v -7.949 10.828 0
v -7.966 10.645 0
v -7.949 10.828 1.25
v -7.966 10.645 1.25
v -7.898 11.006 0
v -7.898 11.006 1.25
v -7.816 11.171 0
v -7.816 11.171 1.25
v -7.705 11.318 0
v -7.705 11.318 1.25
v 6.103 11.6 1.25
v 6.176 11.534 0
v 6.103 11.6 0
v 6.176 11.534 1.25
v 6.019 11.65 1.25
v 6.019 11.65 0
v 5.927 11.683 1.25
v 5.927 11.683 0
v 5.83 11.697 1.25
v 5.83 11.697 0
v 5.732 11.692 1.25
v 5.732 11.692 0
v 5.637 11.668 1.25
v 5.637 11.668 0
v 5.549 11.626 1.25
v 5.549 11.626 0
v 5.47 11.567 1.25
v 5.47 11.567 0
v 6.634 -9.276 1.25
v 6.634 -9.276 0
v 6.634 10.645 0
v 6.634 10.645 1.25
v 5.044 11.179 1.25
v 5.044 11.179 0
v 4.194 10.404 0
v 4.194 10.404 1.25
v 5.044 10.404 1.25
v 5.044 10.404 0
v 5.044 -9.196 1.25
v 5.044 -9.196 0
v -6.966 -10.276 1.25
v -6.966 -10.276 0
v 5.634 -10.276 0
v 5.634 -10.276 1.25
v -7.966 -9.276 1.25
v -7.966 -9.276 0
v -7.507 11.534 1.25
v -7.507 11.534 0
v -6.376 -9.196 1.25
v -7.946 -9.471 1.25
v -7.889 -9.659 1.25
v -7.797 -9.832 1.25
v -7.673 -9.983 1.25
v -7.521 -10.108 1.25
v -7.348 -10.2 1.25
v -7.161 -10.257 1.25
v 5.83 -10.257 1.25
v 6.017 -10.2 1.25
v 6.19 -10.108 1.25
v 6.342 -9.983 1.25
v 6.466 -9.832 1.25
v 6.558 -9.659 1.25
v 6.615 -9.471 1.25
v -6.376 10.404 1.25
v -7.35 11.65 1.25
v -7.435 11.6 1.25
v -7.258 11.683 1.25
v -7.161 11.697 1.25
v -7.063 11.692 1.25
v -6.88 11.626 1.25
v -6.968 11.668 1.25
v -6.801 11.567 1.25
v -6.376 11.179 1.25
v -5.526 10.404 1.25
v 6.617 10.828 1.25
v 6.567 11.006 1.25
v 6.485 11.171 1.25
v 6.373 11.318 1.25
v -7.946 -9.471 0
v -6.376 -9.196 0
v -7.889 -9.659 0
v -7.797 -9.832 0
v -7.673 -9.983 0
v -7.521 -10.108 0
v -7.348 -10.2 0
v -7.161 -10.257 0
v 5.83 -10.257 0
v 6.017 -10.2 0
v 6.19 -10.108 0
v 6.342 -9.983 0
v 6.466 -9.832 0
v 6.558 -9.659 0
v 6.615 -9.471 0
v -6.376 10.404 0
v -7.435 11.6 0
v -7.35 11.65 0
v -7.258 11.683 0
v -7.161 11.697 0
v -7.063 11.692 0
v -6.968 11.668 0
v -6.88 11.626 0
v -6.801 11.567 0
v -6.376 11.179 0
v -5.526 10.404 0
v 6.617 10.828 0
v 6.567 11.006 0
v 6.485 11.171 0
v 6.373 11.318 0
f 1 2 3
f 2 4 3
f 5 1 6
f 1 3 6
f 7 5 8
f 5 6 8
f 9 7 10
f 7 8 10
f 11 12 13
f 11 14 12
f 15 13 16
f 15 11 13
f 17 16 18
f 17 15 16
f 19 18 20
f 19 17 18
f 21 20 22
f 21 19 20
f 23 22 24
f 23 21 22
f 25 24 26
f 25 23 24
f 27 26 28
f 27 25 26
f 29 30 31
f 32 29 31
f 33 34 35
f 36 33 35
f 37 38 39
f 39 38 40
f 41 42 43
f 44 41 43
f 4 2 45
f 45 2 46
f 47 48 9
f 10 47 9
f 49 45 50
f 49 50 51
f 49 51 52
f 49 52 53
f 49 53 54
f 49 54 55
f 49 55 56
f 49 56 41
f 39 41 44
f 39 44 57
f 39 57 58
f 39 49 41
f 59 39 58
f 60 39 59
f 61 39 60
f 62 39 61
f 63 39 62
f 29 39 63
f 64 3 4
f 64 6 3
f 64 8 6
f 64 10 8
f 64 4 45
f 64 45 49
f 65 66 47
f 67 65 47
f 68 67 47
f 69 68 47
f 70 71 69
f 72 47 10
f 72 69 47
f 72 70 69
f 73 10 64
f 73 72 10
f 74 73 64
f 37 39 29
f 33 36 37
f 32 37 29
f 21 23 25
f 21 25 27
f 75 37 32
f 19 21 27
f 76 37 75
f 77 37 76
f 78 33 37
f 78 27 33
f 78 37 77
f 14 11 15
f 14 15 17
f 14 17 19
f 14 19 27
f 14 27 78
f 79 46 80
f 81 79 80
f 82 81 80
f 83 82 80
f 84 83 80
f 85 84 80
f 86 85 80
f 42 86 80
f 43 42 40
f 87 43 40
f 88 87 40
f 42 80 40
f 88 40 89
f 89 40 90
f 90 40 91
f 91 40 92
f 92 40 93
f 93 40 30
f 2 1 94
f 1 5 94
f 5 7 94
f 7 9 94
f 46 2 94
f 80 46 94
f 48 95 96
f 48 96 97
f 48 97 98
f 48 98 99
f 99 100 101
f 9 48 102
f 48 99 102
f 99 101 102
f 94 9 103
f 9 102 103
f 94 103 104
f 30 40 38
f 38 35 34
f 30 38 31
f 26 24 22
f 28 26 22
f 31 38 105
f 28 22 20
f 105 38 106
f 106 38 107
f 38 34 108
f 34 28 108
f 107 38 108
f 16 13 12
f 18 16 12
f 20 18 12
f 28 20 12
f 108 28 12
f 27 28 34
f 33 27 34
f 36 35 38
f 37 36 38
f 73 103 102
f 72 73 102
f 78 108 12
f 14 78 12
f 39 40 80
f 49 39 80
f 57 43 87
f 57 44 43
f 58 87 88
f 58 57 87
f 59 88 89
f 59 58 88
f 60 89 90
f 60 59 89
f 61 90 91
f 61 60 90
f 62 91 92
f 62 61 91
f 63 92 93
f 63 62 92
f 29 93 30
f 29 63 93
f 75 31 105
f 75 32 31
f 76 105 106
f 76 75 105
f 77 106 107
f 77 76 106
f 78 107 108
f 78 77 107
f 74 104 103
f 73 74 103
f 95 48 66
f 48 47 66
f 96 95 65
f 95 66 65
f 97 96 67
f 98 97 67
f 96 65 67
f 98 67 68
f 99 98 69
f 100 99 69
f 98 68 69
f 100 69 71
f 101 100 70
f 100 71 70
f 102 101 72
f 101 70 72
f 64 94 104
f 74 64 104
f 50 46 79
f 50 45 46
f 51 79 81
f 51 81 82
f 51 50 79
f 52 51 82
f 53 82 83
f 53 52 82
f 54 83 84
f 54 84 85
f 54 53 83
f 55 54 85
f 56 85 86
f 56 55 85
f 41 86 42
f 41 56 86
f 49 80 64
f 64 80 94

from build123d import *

# Parameters (mm, degrees)
F1_DEPTH = 1.25
F2_R     = 1
F3_R     = 1
F4_R     = 0.5


with BuildPart() as f1:
    # F0 (on Top) → F1 (new body)
    with BuildSketch(Plane.XY):
        Polygon((-7.965586, 11.031977), (-7.965586, -9.196173), (-6.375586, -9.196173), (-6.375586, 10.403827), (-6.375586, 11.178903), (-7.170586, 11.903827), align=None)
        Polygon((-6.375586, 11.178903), (-6.375586, 10.403827), (-5.525586, 10.403827), align=None)
        Polygon((4.194414, 10.403827), (5.044414, 10.403827), (5.044414, 11.178903), align=None)
        Polygon((5.044414, 10.403827), (5.044414, -9.196173), (6.634414, -9.196173), (6.634414, 11.031977), (5.839414, 11.903827), (5.044414, 11.178903), align=None)
        Polygon((-6.375586, -9.196173), (-7.965586, -9.196173), (-7.965586, -10.276173), (6.634414, -10.276173), (6.634414, -9.196173), (5.044414, -9.196173), align=None)
    extrude(amount=F1_DEPTH)

    # F2
    f2_edges = [f1.edges().sort_by_distance(p)[0] for p in [
        (6.634414, -10.276173, 0.625),
        (-7.965586, -10.276173, 0.625),
    ]]
    fillet(f2_edges, radius=F2_R)

    # F3
    f3_edges = [f1.edges().sort_by_distance(p)[0] for p in [
        (-7.965586, 11.031977, 0.625),
        (6.634414, 11.031977, 0.625),
    ]]
    fillet(f3_edges, radius=F3_R)

    # F4
    f4_edges = [f1.edges().sort_by_distance(p)[0] for p in [
        (5.839414, 11.903827, 0.625),
        (-7.170586, 11.903827, 0.625),
    ]]
    fillet(f4_edges, radius=F4_R)


solid = f1.part
